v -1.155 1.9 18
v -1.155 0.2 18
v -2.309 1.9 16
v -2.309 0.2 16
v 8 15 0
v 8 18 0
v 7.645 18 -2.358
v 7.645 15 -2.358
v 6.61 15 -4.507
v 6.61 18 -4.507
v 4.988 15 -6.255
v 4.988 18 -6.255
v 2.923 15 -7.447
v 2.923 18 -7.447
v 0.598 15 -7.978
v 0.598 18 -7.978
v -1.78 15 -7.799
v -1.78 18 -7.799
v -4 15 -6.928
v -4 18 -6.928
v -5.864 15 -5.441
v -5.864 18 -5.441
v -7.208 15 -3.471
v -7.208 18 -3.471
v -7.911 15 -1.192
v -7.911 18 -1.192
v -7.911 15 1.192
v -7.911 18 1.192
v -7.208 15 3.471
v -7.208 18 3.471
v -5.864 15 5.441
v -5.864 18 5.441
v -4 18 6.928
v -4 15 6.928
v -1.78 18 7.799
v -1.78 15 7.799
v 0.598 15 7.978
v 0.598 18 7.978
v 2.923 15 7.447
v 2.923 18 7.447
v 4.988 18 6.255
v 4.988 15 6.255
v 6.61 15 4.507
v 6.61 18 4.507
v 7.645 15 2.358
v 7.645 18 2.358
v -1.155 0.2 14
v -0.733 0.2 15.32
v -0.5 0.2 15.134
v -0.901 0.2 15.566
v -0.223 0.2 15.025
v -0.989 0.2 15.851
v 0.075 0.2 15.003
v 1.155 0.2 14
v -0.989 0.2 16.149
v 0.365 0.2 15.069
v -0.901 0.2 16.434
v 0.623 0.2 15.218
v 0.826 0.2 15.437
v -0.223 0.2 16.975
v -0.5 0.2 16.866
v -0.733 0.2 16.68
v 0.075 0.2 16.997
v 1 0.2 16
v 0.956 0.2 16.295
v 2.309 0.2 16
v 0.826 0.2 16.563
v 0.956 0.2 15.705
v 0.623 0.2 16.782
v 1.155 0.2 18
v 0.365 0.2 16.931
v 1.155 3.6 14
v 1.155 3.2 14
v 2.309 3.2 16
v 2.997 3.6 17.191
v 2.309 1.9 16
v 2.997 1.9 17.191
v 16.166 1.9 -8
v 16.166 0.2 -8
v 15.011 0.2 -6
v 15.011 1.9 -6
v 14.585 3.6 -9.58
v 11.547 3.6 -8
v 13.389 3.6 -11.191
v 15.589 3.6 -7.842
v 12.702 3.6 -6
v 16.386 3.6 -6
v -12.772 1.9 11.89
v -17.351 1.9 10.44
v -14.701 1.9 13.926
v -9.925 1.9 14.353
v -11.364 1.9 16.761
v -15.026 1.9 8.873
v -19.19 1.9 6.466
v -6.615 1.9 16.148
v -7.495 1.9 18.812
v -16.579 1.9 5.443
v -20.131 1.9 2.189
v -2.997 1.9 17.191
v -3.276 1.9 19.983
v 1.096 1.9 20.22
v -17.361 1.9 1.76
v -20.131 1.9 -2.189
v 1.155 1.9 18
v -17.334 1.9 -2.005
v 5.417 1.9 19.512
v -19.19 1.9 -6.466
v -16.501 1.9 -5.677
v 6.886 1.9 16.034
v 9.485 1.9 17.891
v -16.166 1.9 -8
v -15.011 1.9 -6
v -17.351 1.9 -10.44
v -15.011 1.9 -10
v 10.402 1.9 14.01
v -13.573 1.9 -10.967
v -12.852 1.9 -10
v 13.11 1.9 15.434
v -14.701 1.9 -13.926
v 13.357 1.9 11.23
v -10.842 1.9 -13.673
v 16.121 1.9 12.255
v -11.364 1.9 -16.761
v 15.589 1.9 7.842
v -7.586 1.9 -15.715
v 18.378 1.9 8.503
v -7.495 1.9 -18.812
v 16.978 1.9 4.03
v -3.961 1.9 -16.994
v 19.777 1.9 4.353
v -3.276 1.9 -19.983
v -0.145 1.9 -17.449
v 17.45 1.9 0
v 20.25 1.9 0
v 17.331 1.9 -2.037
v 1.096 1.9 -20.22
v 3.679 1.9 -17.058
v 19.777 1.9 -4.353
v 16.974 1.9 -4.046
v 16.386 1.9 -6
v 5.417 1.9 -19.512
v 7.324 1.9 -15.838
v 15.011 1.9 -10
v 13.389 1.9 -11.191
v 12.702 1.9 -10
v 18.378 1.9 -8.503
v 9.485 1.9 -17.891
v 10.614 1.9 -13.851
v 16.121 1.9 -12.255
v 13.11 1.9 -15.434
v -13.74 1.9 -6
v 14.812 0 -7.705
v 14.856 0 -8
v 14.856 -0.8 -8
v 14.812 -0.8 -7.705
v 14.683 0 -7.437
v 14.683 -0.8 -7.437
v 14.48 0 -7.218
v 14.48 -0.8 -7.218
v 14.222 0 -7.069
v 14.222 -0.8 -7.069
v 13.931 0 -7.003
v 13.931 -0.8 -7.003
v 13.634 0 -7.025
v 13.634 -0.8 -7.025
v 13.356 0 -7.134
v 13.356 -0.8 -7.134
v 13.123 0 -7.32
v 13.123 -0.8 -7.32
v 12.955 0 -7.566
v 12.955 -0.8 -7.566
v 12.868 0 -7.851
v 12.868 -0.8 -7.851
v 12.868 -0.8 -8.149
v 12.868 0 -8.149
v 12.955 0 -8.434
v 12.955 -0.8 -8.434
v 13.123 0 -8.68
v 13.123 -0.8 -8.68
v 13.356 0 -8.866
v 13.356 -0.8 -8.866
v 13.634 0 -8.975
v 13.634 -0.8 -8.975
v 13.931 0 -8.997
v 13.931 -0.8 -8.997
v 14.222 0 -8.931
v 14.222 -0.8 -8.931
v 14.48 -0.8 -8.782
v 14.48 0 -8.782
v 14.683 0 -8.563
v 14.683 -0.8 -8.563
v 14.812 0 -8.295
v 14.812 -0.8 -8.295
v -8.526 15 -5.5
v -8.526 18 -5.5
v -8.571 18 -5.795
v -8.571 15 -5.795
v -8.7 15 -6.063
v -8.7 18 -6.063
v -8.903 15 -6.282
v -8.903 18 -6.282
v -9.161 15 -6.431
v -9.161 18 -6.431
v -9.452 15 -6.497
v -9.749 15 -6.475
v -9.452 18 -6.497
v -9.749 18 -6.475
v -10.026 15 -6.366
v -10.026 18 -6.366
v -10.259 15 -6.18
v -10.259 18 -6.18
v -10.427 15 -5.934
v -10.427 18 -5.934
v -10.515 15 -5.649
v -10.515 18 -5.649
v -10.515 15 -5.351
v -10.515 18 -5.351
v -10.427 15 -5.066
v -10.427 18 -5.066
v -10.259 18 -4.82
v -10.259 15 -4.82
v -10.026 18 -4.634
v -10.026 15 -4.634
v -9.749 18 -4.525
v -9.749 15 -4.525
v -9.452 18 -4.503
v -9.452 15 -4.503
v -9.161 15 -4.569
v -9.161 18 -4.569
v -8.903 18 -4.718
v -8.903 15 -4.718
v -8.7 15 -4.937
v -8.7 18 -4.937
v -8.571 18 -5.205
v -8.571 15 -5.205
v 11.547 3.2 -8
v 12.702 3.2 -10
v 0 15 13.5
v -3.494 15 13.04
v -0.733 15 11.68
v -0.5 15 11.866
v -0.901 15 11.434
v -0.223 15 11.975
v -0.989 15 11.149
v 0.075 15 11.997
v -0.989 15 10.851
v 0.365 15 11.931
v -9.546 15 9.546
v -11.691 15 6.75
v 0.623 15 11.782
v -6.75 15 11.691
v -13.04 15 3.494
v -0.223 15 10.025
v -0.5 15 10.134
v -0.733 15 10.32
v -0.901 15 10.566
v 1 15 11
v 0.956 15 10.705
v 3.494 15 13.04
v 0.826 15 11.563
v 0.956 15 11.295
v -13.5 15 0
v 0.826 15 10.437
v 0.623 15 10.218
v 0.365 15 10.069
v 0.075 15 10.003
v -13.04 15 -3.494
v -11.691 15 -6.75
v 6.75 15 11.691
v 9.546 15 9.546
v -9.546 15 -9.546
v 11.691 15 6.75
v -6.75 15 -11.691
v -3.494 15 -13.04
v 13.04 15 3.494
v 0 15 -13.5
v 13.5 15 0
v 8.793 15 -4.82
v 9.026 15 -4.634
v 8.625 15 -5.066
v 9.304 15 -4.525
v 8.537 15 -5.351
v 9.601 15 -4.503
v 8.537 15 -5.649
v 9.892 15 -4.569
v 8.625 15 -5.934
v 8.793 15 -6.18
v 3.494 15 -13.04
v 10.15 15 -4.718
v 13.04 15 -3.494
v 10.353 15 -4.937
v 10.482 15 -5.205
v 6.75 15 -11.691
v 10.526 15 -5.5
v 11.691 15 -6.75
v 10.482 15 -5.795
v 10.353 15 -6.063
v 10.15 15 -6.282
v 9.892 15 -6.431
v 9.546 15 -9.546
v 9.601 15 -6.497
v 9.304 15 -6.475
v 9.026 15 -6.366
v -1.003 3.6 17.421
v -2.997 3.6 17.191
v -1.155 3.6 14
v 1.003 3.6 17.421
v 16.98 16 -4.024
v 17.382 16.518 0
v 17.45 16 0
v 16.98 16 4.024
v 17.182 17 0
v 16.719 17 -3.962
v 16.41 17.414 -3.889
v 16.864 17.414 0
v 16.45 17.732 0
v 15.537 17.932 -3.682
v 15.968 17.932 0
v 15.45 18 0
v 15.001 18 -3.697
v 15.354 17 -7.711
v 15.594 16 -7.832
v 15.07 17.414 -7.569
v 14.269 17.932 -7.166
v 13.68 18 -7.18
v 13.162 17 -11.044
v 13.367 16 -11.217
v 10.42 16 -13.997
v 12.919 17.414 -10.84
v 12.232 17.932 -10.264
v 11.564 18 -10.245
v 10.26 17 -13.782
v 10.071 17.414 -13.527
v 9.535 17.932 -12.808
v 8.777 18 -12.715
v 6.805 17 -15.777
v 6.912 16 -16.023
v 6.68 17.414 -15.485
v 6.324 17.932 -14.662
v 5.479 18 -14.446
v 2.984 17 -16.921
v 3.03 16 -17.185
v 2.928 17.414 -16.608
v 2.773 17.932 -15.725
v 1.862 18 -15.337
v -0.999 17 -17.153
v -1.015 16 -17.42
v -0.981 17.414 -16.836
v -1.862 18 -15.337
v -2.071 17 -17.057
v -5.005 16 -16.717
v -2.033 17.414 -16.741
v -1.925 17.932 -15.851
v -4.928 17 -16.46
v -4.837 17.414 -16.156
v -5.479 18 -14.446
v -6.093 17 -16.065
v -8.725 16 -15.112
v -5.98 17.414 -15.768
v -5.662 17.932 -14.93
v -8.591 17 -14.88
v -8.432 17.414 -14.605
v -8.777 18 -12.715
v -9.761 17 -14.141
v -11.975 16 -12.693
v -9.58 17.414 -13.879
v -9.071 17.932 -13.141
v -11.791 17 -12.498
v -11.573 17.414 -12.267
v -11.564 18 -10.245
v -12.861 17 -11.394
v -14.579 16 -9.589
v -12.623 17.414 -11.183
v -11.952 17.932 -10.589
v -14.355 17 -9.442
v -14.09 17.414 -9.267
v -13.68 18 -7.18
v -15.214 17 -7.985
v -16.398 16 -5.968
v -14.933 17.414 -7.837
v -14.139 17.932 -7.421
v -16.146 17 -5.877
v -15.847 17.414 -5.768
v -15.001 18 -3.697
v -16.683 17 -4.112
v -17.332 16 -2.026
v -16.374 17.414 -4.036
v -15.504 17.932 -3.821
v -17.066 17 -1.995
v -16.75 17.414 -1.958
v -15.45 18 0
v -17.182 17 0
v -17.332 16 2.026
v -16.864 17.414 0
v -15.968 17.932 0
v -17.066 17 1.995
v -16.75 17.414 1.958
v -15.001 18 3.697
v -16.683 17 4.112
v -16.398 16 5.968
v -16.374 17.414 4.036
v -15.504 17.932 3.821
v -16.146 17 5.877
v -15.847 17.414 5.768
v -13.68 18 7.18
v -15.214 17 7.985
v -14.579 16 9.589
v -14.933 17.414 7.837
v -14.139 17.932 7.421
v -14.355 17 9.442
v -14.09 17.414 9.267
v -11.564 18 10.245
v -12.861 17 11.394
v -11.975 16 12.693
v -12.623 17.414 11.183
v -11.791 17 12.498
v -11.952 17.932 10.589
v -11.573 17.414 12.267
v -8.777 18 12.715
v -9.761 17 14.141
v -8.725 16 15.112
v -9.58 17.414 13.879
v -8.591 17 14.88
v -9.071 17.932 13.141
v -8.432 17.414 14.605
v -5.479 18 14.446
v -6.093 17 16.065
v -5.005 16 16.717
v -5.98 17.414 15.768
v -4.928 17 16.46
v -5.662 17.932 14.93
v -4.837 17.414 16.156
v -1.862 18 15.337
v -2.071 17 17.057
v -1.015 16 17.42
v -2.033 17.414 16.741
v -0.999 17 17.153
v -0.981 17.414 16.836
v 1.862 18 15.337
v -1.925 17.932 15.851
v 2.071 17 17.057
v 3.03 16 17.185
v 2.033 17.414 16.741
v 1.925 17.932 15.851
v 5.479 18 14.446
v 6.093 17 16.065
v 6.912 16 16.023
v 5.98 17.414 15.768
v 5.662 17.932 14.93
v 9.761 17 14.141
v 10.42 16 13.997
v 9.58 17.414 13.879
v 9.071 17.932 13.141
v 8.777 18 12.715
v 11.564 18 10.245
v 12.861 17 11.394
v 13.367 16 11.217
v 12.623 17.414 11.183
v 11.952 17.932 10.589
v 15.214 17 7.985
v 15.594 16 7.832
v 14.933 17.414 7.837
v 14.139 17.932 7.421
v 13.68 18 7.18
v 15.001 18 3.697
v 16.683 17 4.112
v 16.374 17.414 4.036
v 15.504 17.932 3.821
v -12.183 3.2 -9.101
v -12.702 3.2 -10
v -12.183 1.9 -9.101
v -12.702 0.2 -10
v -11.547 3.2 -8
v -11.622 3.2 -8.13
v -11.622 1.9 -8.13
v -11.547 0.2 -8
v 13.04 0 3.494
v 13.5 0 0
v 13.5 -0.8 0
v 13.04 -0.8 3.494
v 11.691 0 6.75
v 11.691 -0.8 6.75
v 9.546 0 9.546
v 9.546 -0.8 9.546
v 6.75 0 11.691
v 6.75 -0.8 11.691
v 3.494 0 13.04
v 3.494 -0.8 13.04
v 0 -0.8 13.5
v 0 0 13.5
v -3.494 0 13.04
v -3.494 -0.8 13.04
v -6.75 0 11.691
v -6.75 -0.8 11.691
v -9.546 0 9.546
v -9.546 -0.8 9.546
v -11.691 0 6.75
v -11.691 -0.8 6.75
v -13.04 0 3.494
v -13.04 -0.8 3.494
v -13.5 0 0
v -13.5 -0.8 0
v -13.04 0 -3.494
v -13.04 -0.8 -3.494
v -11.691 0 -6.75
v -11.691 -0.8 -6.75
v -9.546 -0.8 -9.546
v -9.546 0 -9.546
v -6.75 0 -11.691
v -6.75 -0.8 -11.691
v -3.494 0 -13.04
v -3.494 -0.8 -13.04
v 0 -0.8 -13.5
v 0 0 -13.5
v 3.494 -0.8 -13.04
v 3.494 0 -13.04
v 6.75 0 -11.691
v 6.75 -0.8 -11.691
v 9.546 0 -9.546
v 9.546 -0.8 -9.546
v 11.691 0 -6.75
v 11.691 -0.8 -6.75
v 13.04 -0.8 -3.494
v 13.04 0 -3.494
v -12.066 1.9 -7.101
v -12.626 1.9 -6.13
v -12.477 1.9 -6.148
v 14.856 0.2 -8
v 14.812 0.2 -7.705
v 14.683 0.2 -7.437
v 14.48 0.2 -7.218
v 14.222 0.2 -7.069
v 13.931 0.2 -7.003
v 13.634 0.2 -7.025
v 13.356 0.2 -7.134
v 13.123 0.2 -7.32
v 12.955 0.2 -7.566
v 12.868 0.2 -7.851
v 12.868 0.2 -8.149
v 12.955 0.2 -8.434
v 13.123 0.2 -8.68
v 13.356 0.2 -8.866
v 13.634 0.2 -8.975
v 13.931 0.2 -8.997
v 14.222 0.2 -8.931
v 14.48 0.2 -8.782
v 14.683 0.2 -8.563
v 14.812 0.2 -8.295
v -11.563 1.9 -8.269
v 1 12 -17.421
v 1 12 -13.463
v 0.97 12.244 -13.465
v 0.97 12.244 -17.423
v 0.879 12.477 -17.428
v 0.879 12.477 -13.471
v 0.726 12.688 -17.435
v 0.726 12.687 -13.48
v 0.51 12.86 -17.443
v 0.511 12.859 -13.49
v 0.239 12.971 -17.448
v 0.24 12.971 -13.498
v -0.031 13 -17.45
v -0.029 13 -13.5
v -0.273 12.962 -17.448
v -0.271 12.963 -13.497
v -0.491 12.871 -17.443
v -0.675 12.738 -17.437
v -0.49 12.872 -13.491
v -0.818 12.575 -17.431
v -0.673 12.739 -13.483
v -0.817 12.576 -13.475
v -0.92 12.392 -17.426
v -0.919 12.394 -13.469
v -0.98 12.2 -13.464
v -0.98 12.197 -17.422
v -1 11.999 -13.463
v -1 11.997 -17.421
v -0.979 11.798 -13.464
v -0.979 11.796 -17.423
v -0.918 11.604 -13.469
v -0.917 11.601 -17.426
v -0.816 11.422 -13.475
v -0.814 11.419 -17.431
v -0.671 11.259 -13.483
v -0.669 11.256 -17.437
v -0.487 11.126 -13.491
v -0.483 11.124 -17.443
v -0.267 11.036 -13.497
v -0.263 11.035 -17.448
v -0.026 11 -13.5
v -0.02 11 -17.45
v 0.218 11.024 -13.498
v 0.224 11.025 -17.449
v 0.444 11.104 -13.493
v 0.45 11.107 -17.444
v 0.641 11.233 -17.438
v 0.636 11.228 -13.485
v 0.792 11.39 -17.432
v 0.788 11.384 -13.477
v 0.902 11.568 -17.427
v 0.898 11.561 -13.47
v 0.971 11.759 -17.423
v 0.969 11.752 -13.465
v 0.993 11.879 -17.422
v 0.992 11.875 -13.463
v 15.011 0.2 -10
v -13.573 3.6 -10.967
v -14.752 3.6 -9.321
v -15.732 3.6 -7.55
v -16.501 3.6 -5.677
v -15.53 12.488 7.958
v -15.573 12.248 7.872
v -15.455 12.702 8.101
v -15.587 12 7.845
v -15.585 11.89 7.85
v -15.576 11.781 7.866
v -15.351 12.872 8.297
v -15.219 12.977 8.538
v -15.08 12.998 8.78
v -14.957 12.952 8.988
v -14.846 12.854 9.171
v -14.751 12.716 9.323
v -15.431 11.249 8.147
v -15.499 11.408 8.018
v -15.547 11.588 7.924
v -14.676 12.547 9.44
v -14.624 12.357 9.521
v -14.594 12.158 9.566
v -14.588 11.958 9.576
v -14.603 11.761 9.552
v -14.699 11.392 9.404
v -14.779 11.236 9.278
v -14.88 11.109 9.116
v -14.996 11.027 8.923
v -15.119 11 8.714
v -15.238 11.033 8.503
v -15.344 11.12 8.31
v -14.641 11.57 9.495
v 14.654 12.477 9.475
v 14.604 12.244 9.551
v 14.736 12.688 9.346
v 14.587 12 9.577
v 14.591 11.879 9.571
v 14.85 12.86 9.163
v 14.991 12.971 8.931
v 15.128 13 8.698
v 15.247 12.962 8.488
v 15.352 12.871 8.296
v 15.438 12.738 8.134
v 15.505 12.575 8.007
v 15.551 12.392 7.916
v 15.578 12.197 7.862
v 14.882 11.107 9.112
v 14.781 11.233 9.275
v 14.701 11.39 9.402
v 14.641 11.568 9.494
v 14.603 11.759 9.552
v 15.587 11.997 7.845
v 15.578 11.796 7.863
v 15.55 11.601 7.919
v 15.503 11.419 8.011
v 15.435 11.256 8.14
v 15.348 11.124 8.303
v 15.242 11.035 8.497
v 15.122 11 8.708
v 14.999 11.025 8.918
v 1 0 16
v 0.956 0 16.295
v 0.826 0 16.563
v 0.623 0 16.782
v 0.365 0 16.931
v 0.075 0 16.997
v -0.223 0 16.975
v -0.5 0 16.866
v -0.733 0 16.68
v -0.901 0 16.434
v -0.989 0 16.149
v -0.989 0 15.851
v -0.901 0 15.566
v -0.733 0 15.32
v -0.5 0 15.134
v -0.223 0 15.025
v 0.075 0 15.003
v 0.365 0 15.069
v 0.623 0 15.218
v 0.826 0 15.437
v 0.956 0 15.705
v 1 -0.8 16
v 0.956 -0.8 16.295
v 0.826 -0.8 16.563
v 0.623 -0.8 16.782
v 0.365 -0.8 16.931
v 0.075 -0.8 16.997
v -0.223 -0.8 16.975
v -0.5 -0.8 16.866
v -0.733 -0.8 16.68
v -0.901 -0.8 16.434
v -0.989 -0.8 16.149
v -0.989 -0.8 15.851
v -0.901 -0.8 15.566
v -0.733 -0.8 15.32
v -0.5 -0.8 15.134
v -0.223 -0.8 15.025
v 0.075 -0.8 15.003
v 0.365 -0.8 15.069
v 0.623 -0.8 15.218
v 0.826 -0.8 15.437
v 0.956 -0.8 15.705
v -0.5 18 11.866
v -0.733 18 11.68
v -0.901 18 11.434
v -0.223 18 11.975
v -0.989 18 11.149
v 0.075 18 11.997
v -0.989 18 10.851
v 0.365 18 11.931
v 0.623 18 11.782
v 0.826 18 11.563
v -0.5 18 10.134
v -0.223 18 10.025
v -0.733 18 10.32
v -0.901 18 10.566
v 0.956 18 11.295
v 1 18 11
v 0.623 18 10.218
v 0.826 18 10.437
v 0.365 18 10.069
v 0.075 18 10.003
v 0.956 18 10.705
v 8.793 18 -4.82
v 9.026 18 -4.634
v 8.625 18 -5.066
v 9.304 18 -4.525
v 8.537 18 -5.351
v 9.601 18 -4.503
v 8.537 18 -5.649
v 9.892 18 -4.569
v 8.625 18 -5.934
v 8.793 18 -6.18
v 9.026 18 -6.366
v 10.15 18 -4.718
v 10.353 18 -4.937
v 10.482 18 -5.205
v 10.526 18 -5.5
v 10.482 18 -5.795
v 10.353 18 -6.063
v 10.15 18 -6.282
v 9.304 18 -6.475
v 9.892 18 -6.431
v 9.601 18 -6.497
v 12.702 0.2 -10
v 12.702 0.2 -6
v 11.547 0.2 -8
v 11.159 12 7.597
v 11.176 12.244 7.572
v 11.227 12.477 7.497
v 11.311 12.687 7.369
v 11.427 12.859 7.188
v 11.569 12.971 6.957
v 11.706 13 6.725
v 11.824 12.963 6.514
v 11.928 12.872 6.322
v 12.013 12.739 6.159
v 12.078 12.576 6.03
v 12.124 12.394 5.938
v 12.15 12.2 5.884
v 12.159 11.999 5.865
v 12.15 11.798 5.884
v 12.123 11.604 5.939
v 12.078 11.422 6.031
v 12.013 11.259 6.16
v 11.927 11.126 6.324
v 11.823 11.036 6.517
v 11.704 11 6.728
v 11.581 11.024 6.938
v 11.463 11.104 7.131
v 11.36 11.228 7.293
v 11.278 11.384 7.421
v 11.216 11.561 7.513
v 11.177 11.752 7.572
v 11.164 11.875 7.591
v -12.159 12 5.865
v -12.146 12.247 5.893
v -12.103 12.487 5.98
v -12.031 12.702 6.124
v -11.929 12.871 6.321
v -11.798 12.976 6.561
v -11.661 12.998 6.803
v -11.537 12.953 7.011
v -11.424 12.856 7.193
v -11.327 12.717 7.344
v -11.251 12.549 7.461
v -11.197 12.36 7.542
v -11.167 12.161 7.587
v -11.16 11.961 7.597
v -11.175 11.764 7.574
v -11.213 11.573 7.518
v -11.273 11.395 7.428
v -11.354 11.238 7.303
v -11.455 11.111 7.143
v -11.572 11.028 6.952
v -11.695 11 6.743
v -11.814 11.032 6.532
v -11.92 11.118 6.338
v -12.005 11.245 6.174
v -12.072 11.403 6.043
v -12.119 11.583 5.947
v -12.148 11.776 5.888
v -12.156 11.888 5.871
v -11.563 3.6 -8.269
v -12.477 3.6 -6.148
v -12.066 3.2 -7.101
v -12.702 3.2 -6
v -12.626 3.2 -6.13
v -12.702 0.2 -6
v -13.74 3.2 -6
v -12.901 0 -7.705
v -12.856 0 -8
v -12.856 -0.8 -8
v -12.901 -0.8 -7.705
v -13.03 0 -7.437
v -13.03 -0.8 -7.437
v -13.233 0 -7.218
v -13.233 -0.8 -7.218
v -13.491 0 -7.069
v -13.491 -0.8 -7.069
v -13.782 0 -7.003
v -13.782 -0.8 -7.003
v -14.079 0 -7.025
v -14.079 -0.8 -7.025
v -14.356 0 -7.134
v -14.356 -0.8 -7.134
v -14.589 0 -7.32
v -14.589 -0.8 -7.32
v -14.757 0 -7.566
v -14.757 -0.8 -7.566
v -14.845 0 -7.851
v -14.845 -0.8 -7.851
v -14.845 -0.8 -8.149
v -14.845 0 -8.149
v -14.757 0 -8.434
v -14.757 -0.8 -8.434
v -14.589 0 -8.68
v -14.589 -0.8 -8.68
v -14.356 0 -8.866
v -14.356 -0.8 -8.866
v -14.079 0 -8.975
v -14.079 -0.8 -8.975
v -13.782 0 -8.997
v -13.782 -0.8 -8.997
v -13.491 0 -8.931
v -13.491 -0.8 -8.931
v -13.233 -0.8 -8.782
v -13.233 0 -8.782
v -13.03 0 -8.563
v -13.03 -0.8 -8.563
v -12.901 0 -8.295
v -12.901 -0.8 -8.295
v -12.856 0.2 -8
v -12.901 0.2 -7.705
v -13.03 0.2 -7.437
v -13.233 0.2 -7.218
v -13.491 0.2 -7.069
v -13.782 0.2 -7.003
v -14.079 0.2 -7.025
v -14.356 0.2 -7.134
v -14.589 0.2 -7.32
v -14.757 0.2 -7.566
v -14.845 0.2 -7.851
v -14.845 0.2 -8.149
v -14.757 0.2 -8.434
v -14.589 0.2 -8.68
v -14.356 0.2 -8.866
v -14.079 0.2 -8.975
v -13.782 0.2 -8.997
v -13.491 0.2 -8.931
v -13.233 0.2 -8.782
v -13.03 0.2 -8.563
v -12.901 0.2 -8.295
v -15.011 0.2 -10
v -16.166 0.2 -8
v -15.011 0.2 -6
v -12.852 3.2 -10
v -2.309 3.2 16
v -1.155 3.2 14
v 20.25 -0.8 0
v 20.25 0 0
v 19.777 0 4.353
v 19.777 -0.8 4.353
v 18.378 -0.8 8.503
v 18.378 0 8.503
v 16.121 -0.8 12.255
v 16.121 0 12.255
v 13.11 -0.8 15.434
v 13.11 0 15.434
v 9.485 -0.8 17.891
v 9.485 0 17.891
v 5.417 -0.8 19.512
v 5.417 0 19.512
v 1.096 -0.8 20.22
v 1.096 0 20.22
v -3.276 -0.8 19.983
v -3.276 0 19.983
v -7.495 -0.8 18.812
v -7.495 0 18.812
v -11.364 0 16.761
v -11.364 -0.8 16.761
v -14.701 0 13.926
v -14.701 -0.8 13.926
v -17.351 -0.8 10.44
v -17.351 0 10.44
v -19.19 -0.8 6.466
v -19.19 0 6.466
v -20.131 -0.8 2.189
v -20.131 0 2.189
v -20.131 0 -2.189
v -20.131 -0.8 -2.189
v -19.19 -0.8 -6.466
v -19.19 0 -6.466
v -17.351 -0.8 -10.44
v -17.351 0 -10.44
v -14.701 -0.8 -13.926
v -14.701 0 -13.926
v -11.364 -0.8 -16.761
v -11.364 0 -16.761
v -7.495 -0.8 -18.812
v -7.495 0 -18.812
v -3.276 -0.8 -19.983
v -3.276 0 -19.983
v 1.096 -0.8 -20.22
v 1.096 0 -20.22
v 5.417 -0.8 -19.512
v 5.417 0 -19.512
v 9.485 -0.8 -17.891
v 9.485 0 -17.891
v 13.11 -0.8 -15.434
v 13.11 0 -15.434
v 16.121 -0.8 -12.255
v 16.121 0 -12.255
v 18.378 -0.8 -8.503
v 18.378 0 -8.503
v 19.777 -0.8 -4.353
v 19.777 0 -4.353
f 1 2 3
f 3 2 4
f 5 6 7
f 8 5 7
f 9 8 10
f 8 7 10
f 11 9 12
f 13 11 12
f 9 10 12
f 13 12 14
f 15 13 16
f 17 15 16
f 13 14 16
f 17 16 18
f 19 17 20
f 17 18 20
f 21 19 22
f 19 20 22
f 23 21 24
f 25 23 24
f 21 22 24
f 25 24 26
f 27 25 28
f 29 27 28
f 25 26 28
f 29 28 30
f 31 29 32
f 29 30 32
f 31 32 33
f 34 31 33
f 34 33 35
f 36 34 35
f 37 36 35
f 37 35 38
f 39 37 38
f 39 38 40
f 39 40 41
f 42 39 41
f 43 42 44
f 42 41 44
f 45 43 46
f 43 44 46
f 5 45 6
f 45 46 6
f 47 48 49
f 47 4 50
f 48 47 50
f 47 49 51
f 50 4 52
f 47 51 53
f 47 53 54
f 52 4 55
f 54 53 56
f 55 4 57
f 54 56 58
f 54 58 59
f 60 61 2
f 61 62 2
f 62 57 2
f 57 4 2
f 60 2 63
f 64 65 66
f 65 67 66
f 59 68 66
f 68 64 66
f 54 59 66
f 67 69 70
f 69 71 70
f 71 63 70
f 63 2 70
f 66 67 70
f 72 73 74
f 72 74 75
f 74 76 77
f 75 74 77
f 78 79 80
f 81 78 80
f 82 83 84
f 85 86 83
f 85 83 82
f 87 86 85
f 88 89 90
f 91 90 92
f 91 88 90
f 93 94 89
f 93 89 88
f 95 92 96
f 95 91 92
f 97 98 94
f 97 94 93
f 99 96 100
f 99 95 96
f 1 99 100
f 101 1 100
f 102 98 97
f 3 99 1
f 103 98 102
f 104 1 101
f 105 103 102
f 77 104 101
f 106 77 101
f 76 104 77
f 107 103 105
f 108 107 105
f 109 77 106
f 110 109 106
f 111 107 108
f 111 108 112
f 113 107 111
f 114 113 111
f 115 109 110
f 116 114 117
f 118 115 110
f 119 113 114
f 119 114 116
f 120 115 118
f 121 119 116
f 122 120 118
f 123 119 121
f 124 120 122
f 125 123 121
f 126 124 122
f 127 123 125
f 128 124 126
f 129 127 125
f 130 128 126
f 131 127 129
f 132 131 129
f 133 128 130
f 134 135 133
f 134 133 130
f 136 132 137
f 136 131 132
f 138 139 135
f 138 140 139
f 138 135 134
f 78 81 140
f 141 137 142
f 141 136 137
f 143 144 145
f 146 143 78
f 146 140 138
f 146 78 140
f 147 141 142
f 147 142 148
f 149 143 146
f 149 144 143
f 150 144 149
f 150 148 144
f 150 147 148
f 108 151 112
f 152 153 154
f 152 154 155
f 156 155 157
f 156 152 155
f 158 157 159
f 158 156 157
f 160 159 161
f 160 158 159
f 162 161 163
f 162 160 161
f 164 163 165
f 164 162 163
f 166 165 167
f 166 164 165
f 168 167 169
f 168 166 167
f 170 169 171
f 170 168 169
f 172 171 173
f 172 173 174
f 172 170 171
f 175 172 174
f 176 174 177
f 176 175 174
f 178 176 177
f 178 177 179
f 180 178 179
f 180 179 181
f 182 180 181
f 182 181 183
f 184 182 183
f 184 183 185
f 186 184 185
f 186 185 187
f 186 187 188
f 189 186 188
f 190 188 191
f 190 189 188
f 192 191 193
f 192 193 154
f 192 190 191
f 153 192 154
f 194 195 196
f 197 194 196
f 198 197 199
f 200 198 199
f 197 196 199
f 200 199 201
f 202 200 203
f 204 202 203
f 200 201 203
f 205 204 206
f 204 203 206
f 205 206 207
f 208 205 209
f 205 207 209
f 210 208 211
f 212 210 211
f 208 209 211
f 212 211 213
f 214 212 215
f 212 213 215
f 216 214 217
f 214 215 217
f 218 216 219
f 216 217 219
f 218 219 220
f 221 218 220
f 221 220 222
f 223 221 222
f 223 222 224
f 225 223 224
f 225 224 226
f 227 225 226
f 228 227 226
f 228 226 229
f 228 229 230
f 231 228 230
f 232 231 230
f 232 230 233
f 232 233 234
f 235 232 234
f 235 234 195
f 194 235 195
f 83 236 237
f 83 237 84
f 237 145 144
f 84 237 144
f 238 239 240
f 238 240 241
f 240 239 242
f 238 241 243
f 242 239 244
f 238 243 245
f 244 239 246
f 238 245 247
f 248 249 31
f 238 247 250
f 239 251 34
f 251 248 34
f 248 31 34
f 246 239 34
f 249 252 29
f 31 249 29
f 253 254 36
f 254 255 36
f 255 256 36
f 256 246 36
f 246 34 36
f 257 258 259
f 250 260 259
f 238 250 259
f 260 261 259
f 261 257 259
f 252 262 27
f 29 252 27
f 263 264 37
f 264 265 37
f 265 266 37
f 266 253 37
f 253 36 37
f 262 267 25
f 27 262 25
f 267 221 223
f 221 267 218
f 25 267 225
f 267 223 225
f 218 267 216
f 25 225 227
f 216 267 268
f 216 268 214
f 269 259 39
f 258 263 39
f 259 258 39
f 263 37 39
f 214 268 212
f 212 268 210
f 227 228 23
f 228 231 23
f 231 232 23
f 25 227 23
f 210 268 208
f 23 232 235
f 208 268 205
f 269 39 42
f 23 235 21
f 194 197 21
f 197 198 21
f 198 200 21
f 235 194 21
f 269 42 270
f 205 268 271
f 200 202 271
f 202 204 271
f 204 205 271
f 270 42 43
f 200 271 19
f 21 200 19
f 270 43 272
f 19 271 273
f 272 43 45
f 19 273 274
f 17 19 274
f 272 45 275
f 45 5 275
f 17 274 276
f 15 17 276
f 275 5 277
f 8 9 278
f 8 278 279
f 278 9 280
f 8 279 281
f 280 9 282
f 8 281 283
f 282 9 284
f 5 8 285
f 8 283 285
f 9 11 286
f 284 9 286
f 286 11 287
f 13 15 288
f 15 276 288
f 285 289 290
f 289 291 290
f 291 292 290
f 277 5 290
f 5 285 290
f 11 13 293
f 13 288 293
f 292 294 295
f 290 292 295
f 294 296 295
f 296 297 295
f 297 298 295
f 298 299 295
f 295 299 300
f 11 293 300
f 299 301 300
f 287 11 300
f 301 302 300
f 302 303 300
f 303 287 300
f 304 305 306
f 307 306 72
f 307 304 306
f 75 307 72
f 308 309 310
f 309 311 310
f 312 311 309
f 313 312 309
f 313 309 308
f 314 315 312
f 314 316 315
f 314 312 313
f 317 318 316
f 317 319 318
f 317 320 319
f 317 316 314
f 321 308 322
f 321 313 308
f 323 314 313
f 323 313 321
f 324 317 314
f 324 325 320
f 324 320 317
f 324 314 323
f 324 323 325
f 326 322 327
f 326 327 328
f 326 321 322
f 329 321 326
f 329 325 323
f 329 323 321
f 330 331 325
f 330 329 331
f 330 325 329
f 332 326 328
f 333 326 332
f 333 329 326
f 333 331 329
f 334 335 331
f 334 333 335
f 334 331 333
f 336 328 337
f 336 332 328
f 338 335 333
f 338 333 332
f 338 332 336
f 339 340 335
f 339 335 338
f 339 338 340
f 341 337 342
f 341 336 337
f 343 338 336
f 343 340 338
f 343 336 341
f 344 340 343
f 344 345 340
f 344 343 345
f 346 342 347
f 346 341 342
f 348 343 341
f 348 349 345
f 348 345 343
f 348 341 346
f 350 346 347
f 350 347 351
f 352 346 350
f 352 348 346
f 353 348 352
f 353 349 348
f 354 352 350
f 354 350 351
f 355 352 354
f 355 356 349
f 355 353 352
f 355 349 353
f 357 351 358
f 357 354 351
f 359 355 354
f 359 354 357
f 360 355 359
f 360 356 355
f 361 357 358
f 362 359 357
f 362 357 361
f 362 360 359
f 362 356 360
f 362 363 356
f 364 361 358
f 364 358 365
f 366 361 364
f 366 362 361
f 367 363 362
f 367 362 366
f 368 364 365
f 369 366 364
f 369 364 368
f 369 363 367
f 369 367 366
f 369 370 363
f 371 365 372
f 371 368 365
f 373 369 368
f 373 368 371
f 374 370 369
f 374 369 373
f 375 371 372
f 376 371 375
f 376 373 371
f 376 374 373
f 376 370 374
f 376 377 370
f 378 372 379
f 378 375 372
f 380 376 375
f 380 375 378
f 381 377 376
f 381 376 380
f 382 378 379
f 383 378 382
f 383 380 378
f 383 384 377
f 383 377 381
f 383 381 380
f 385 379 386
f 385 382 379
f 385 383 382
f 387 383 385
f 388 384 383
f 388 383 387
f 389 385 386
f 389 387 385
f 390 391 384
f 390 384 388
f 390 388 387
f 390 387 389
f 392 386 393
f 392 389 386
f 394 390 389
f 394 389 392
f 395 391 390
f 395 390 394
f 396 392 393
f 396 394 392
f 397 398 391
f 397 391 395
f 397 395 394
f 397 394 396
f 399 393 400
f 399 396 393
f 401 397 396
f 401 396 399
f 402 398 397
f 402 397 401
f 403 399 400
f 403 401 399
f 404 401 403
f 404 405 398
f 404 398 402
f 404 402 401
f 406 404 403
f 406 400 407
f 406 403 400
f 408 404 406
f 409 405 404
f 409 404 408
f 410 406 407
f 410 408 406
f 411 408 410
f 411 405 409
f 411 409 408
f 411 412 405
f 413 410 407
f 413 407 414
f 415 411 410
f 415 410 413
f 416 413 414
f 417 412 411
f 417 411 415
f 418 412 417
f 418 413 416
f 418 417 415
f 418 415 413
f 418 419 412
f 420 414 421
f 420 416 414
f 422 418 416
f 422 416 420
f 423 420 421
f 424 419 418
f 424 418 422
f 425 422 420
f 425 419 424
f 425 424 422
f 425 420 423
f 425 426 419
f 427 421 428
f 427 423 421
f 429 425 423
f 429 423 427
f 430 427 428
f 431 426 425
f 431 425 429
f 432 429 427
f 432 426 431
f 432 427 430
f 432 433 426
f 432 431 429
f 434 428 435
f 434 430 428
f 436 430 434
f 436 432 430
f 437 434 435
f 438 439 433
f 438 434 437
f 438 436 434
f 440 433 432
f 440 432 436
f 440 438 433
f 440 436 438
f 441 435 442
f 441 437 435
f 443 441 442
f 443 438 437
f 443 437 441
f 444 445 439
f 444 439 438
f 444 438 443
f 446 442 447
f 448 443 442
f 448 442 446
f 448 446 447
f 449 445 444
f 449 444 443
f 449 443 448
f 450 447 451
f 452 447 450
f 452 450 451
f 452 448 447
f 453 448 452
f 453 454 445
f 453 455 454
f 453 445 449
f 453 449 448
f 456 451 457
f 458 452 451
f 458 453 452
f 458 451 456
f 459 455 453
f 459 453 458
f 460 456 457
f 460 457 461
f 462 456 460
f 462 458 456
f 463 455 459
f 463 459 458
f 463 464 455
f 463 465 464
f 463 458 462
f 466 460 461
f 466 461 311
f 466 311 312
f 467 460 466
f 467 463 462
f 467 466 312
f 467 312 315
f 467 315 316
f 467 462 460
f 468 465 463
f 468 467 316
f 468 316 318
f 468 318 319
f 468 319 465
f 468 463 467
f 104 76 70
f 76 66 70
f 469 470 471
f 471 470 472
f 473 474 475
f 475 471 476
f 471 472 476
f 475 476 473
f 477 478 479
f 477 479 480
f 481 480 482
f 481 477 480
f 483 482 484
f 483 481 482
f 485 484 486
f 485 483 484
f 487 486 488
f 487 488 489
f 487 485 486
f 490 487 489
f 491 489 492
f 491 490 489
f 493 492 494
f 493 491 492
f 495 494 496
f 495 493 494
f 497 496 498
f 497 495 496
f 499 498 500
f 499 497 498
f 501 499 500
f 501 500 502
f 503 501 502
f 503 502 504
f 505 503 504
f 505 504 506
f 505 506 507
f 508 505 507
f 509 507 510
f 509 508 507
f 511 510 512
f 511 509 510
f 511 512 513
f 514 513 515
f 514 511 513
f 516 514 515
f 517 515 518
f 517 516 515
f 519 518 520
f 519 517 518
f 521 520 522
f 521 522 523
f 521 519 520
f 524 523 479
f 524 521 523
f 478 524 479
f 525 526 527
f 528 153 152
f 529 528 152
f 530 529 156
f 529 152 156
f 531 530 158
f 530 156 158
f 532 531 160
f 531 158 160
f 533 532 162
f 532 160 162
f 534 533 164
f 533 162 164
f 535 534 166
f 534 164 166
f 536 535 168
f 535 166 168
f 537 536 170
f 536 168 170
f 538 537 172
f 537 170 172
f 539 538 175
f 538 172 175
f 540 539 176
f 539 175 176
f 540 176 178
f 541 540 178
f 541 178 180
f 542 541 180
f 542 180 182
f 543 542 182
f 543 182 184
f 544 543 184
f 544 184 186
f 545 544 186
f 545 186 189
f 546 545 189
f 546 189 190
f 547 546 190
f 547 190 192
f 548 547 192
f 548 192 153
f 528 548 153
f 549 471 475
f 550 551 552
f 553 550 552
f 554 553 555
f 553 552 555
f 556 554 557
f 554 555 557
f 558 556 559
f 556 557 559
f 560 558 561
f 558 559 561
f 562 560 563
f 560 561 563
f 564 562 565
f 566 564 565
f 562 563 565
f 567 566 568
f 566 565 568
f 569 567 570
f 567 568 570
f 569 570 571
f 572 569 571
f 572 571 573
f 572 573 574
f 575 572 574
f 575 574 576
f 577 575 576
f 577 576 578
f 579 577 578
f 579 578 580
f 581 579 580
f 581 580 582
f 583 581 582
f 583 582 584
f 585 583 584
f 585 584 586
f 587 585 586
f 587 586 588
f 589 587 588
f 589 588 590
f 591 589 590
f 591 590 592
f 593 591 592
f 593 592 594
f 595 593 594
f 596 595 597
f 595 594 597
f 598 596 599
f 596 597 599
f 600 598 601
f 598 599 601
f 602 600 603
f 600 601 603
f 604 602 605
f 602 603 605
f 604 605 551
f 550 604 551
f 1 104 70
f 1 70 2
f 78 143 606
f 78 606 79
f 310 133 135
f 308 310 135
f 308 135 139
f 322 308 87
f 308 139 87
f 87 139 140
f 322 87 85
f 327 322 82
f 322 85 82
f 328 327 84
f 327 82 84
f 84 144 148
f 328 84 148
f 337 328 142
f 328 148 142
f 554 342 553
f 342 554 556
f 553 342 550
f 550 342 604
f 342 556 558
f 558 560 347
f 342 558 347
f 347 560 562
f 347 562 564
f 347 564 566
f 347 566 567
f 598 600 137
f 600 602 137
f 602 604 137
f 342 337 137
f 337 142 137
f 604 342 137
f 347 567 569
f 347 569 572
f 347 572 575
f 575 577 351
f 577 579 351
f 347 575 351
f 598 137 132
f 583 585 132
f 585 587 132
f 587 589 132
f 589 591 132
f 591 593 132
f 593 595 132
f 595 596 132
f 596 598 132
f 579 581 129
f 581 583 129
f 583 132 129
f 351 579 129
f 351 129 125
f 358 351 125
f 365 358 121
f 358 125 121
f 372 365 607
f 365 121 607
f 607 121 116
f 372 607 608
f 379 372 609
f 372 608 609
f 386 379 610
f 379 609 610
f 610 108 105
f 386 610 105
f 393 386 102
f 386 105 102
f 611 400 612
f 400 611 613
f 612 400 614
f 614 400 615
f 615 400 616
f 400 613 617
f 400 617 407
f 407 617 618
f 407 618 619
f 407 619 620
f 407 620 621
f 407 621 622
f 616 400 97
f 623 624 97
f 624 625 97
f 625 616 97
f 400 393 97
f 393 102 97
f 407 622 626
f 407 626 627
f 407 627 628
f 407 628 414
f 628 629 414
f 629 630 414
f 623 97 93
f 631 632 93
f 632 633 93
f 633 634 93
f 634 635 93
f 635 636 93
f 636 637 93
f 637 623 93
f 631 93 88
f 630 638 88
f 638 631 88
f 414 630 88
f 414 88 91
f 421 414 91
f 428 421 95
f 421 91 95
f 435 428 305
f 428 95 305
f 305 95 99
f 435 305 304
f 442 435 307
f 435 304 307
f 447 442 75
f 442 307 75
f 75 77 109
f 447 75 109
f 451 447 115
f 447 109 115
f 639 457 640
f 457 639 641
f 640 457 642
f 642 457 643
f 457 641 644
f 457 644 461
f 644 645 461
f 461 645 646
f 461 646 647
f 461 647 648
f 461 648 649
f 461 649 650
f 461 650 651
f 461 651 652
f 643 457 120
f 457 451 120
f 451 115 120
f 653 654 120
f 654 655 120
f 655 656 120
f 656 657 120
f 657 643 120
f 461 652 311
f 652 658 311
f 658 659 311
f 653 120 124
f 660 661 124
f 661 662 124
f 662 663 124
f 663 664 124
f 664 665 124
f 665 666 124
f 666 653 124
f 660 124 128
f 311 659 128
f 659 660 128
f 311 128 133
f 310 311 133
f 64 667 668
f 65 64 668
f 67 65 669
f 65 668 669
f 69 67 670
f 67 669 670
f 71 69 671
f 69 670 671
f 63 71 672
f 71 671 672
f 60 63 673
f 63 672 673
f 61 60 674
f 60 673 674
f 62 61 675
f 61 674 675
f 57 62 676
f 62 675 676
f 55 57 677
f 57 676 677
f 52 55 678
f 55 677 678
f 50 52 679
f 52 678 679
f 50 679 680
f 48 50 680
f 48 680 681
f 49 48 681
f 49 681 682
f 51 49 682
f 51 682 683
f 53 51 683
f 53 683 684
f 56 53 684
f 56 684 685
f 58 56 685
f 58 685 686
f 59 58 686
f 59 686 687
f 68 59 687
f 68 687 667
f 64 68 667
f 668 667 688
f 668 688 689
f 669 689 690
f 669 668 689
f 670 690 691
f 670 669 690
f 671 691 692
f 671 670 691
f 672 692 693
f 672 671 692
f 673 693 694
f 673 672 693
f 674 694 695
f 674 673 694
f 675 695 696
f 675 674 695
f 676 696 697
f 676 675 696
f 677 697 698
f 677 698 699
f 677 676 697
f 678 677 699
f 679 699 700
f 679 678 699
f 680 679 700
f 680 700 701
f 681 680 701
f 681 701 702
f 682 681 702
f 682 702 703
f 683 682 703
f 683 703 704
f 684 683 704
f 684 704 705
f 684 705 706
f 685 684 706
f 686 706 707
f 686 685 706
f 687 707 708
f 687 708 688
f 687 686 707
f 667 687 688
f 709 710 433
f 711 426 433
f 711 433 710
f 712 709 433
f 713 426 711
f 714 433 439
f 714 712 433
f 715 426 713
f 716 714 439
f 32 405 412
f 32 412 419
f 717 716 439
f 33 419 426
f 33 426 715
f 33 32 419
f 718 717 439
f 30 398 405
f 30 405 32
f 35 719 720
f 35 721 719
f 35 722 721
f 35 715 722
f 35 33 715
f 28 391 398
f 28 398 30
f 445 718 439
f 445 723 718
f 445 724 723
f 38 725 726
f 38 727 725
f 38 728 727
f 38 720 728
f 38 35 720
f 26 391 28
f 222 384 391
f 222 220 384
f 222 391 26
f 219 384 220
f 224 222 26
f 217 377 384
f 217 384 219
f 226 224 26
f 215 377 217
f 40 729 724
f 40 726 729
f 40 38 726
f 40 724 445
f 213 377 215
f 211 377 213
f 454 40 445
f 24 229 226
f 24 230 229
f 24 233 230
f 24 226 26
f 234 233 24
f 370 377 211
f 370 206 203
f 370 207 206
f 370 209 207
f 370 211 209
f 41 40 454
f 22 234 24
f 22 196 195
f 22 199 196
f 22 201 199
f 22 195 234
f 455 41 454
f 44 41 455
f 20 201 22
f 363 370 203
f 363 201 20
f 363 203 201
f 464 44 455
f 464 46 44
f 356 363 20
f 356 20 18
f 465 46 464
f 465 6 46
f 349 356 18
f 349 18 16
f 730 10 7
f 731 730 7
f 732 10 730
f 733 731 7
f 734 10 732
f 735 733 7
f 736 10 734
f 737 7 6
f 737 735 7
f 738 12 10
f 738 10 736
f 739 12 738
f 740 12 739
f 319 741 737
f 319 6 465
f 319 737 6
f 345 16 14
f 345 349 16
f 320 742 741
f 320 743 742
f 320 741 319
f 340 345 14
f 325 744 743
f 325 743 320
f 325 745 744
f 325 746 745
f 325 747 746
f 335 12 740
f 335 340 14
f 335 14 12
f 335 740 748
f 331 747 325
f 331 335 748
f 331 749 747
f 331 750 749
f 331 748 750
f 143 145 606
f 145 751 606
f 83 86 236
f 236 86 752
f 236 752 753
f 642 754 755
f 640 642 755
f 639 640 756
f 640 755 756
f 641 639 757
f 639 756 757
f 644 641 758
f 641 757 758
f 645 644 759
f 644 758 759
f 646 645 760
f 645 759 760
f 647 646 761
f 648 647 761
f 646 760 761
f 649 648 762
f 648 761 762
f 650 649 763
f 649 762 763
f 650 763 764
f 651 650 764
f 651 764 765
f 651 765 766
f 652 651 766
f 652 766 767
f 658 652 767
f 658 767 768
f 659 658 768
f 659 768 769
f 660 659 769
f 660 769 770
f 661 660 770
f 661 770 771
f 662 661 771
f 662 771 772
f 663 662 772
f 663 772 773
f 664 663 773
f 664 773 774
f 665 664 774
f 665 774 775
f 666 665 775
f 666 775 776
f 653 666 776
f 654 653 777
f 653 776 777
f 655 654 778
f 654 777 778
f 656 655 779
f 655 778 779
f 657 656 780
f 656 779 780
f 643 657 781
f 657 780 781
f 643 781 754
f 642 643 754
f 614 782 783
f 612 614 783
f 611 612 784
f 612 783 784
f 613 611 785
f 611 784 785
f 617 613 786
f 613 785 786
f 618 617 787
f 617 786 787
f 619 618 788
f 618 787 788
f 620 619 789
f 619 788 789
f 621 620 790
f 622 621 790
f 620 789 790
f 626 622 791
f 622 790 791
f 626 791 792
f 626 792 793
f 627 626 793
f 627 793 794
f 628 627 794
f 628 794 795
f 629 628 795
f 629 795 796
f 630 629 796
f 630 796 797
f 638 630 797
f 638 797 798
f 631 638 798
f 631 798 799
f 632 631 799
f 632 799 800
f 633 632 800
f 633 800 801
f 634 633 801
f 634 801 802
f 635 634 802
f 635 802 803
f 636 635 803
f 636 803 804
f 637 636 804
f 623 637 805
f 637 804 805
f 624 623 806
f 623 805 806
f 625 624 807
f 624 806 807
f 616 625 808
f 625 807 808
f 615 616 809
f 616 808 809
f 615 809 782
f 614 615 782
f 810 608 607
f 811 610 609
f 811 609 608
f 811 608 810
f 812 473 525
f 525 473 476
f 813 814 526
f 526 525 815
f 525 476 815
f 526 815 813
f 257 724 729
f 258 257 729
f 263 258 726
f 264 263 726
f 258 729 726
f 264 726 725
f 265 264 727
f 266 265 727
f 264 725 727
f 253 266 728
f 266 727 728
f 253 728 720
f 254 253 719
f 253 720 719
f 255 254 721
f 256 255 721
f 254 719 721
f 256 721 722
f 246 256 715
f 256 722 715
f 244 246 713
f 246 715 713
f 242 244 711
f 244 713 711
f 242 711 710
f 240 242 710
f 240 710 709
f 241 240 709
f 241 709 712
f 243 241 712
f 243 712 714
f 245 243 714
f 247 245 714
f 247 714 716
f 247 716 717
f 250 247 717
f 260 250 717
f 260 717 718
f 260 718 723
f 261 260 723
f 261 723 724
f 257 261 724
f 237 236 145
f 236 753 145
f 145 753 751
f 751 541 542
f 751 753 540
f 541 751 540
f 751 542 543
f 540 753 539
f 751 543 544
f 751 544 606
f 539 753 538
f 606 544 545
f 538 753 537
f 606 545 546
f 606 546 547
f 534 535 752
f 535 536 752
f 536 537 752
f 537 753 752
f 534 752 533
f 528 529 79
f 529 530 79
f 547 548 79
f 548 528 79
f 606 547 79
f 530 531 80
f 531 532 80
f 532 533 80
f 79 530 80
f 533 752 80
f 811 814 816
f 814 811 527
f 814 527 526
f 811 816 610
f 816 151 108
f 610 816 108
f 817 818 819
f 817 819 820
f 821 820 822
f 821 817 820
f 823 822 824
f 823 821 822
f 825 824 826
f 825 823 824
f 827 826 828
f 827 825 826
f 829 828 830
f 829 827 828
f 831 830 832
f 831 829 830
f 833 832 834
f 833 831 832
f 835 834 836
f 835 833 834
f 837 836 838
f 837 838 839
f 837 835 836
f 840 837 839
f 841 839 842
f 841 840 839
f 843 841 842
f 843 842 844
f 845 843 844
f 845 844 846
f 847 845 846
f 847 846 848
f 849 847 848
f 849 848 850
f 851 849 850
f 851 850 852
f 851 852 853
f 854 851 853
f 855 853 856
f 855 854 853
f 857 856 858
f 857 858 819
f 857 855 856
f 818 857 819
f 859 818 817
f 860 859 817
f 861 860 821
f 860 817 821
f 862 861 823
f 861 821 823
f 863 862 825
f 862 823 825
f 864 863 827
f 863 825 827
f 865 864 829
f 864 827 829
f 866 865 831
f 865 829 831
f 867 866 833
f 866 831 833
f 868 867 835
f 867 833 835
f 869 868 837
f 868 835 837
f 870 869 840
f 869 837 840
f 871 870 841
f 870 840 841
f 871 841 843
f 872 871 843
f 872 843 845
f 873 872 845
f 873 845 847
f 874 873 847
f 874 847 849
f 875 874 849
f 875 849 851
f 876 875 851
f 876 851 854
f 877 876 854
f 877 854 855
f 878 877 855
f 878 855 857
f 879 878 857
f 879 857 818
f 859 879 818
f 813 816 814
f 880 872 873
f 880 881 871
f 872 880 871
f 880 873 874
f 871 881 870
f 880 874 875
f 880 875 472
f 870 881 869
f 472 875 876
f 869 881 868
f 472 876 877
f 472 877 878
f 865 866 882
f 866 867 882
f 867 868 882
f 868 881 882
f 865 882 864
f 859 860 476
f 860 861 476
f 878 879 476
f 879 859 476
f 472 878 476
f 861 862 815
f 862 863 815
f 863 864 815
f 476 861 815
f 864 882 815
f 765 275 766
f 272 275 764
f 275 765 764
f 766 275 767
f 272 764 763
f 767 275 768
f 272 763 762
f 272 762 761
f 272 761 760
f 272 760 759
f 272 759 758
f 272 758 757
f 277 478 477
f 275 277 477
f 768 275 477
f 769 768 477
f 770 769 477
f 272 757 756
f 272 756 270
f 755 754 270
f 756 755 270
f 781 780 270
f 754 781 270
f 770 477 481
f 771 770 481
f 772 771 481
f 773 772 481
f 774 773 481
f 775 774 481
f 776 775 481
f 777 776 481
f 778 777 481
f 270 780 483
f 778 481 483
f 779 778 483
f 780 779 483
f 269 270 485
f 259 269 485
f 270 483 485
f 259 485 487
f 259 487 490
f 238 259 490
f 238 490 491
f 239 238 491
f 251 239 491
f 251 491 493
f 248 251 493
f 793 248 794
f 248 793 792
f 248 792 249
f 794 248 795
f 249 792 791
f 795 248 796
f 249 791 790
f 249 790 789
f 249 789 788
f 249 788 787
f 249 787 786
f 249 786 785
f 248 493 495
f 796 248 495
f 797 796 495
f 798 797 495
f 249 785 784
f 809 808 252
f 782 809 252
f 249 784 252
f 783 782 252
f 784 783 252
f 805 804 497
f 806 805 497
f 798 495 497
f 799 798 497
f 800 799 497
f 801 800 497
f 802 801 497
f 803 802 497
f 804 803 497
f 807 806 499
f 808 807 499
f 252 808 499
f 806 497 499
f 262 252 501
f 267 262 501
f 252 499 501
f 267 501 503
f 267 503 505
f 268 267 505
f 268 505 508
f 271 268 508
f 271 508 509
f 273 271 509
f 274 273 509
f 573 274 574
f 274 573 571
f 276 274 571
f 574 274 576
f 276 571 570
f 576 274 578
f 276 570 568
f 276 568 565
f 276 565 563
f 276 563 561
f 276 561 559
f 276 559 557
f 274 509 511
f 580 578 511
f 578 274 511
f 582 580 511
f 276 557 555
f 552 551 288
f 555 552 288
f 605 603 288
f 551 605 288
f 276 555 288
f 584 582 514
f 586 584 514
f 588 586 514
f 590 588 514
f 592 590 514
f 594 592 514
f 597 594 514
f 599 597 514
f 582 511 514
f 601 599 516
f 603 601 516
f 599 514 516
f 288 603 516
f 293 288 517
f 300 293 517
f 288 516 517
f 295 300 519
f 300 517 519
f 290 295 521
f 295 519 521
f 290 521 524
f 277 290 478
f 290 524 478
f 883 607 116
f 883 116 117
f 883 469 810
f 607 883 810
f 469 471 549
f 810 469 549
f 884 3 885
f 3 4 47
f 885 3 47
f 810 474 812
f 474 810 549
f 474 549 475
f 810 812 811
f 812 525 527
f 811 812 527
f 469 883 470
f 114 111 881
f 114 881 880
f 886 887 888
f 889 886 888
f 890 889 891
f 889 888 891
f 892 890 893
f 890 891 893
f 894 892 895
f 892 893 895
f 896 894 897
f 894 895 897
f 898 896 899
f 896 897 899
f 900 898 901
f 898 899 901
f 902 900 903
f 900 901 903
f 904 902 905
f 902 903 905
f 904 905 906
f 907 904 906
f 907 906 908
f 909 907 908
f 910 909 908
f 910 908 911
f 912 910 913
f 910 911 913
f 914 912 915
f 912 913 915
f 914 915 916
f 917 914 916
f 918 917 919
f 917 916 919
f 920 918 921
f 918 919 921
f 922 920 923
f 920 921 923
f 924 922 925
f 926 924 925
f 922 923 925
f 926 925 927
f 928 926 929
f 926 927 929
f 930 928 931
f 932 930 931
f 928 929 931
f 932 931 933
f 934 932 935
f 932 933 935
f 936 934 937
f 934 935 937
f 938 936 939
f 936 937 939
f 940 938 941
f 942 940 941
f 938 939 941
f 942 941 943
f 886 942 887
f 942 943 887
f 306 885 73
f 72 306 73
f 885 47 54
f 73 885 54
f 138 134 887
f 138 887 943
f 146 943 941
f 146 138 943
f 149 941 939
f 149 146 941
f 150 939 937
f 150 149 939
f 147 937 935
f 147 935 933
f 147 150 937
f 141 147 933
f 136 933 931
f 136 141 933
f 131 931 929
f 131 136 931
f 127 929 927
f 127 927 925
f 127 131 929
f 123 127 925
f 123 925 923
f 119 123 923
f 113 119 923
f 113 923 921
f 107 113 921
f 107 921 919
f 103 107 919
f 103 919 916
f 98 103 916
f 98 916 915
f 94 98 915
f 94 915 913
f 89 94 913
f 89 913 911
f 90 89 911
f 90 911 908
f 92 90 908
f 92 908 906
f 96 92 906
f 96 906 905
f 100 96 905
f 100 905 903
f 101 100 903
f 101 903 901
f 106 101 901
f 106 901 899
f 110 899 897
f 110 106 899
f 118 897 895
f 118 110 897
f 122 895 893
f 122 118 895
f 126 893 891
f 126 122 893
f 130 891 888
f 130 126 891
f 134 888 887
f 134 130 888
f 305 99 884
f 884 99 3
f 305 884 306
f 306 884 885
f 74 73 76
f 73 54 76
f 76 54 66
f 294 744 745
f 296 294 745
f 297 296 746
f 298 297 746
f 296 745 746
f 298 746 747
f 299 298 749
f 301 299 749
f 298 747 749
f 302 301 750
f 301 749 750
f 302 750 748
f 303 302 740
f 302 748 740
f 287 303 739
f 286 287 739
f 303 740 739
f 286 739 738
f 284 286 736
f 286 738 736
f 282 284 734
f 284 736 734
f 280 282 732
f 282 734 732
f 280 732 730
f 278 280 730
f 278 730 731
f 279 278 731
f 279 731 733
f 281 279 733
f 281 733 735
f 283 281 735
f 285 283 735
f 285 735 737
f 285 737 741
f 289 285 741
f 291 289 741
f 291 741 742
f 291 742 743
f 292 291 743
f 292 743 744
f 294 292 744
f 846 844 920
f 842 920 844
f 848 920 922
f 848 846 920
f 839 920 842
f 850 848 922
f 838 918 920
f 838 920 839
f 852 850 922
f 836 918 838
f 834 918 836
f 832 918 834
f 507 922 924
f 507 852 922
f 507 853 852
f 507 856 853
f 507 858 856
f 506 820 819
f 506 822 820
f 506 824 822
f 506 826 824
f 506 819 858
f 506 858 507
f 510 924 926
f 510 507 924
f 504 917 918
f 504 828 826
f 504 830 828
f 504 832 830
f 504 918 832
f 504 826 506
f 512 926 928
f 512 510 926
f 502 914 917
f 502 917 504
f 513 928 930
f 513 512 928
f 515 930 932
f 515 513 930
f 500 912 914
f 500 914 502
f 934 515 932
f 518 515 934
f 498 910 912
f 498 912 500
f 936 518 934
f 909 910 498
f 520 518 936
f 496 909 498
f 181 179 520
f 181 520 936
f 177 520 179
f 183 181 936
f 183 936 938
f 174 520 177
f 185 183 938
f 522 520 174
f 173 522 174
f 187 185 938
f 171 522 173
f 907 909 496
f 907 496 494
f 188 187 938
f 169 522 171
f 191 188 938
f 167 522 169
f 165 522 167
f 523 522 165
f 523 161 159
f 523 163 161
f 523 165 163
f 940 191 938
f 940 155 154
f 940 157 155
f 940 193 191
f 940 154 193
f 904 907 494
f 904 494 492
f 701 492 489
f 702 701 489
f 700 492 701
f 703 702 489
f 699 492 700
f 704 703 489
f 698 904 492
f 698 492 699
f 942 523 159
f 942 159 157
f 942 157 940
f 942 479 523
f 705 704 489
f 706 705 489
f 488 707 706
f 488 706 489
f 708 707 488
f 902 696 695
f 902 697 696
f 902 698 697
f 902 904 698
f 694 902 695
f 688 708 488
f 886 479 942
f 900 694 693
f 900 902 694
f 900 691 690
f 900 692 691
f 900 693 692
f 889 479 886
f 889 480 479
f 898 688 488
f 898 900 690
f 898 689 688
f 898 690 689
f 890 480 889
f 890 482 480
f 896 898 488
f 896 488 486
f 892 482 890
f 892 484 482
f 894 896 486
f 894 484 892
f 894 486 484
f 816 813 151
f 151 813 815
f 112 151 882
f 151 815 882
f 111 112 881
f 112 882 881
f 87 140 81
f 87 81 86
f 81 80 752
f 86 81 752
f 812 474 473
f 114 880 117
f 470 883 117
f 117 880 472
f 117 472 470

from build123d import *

# Parameters (mm, degrees)
SKETCH1_R                = 17.45
SKETCH1_R_2              = 12.45
BOSS_EXTRUDE1_DEPTH      = 8
BOSS_EXTRUDE1_DEPTH_BACK = 25
SKETCH1_2_R              = 17.45
SKETCH1_2_R_2            = 12.45
BOSS_EXTRUDE3_DEPTH      = 18
SKETCH3_R                = 12.45
SKETCH3_R_2              = 8
BOSS_EXTRUDE4_DEPTH      = 3
SKETCH4_R                = 1
CUT_EXTRUDE1_DEPTH       = 10
SKETCH6_R                = 13.5
CUT_EXTRUDE2_DEPTH       = 40
SKETCH7_R                = 1
CUT_EXTRUDE3_DEPTH       = 21
CIRPATTERN1_COUNT        = 3
BOSS_EXTRUDE5_START      = -16.1
SKETCH8_R                = 20.25
SKETCH8_R_2              = 13.5
BOSS_EXTRUDE5_DEPTH      = 3
FILLET1_R                = 2
SKETCH9_W                = 226.458017819
SKETCH9_H                = 42.937005292
CUT_EXTRUDE4_DEPTH       = 34
CUT_EXTRUDE4_DEPTH_BACK  = 62
CUT_EXTRUDE5_START       = -1.9
CUT_EXTRUDE5_DEPTH       = 1.7
CUT_EXTRUDE5_DEPTH_BACK  = 1.3
SKETCH11_R               = 1
CUT_EXTRUDE6_DEPTH       = 3
CUT_EXTRUDE7_START       = -1.9
CUT_EXTRUDE7_DEPTH       = 1.7
SKETCH14_R               = 20.25
SKETCH14_R_2             = 1
SKETCH14_R_3             = 13.5
BOSS_EXTRUDE6_DEPTH      = 0.8


with BuildPart() as part:
    # Sketch1 → Boss-Extrude1 (new body, two sides)
    with BuildSketch(Plane(origin=(0, 0, 0), x_dir=(1, 0, 0), z_dir=(0, 1, 0))) as boss_extrude1_sk:
        Circle(SKETCH1_R)
        Circle(SKETCH1_R_2, mode=Mode.SUBTRACT)
    extrude(amount=BOSS_EXTRUDE1_DEPTH)
    extrude(boss_extrude1_sk.sketch, amount=-BOSS_EXTRUDE1_DEPTH_BACK)

    # Sketch1<2> → Boss-Extrude3 (add)
    with BuildSketch(Plane(origin=(0, 0, 0), x_dir=(1, 0, 0), z_dir=(0, 1, 0))):
        Circle(SKETCH1_2_R)
        Circle(SKETCH1_2_R_2, mode=Mode.SUBTRACT)
    extrude(amount=BOSS_EXTRUDE3_DEPTH)

    # Sketch3 → Boss-Extrude4 (add)
    with BuildSketch(Plane(origin=(0, 18, 0), x_dir=(1, 0, 0), z_dir=(0, 1, 0))):
        Circle(SKETCH3_R)
        Circle(SKETCH3_R_2, mode=Mode.SUBTRACT)
    extrude(amount=-BOSS_EXTRUDE4_DEPTH)

    # Sketch4 → Cut-Extrude1 (cut)
    with BuildSketch(Plane(origin=(0, 18, 0), x_dir=(1, 0, 0), z_dir=(0, 1, 0))):
        with Locations((9.526279442, 5.5)):
            Circle(SKETCH4_R)
        with Locations((-9.526279442, 5.5)):
            Circle(SKETCH4_R)
        with Locations((0, -11)):
            Circle(SKETCH4_R)
    extrude(amount=-CUT_EXTRUDE1_DEPTH, mode=Mode.SUBTRACT)

    # Sketch6 → Cut-Extrude2 (cut)
    with BuildSketch(Plane.XZ.offset(25)):
        Circle(SKETCH6_R)
    extrude(amount=-CUT_EXTRUDE2_DEPTH, mode=Mode.SUBTRACT)

    # Sketch7 → Cut-Extrude3 (cut)
    with BuildSketch(Plane.XY):
        with Locations((0, 12)):
            Circle(SKETCH7_R)
    cut_extrude3 = extrude(amount=-CUT_EXTRUDE3_DEPTH, mode=Mode.SUBTRACT)

    # CirPattern1: Cut-Extrude3 ×3 about axis
    cirpattern1_axis = Axis((0, 53.183766184, 0), (0, -1, 0))
    for i in range(1, CIRPATTERN1_COUNT):
        add(cut_extrude3.rotate(cirpattern1_axis, i * 360 / CIRPATTERN1_COUNT), mode=Mode.SUBTRACT)

    # Sketch8 → Boss-Extrude5 (add)
    with BuildSketch(Plane(origin=(0, 18, 0), x_dir=(1, 0, 0), z_dir=(0, 1, 0)).offset(BOSS_EXTRUDE5_START)):
        Circle(SKETCH8_R)
        Circle(SKETCH8_R_2, mode=Mode.SUBTRACT)
    extrude(amount=-BOSS_EXTRUDE5_DEPTH)

    # Fillet1
    fillet1_edges = [part.edges().sort_by_distance(p)[0] for p in [
        (-17.45, 18, 0),
    ]]
    fillet(fillet1_edges, radius=FILLET1_R)

    # Sketch9 → Cut-Extrude4 (cut, two sides)
    with BuildSketch(Plane(origin=(0, 0, 0), x_dir=(0, 0, -1), z_dir=(1, 0, 0))) as cut_extrude4_sk:
        with Locations((-4.854722567, -21.468502646)):
            Rectangle(SKETCH9_W, SKETCH9_H)
    extrude(amount=CUT_EXTRUDE4_DEPTH, mode=Mode.SUBTRACT)
    extrude(cut_extrude4_sk.sketch, amount=-CUT_EXTRUDE4_DEPTH_BACK, mode=Mode.SUBTRACT)

    # Sketch10 → Cut-Extrude5 (cut, two sides)
    with BuildSketch(Plane.XZ.offset(CUT_EXTRUDE5_START)) as cut_extrude5_sk:
        Polygon((12.701705922, -10), (15.011106999, -10), (16.165807537, -8), (15.011106999, -6), (12.701705922, -6), (11.547005384, -8), align=None)
        Polygon((-15.011106999, -6), (-16.165807537, -8), (-15.011106999, -10), (-12.701705922, -10), (-11.547005384, -8), (-12.701705922, -6), align=None)
        Polygon((-1.154700538, 18), (-2.309401077, 16), (-1.154700538, 14), (1.154700538, 14), (2.309401077, 16), (1.154700538, 18), align=None)
    extrude(amount=CUT_EXTRUDE5_DEPTH, mode=Mode.SUBTRACT)
    extrude(cut_extrude5_sk.sketch, amount=-CUT_EXTRUDE5_DEPTH_BACK, mode=Mode.SUBTRACT)

    # Sketch11 → Cut-Extrude6 (cut)
    with BuildSketch(Plane.XZ):
        with Locations((0, 16)):
            Circle(SKETCH11_R)
        with Locations((13.856406461, -8)):
            Circle(SKETCH11_R)
        with Locations((-13.856406461, -8)):
            Circle(SKETCH11_R)
    extrude(amount=-CUT_EXTRUDE6_DEPTH, mode=Mode.SUBTRACT)

    # Sketch13 → Cut-Extrude7 (cut)
    with BuildSketch(Plane.XZ.offset(CUT_EXTRUDE7_START)):
        Polygon((13.856406461, -12), (17.320508076, -6), (12.701705922, -6), (11.547005384, -8), align=None)
        Polygon((-17.064341974, -5.610617289), (-14.321704831, -11.972845004), (-11.562683328, -8.268640139), (-12.476895709, -6.147897568), align=None)
        Polygon((-3.464101615, 18), (-1.154700538, 14), (1.154700538, 14), (3.464101615, 18), align=None)
    extrude(amount=-CUT_EXTRUDE7_DEPTH, mode=Mode.SUBTRACT)

    # Sketch14 → Boss-Extrude6 (add)
    with BuildSketch(Plane.XZ):
        Circle(SKETCH14_R)
        with Locations((0, 16)):
            Circle(SKETCH14_R_2, mode=Mode.SUBTRACT)
        with Locations((13.856406461, -8)):
            Circle(SKETCH14_R_2, mode=Mode.SUBTRACT)
        with Locations((-13.856406461, -8)):
            Circle(SKETCH14_R_2, mode=Mode.SUBTRACT)
        Circle(SKETCH14_R_3, mode=Mode.SUBTRACT)
    extrude(amount=BOSS_EXTRUDE6_DEPTH)


solid = part.part
